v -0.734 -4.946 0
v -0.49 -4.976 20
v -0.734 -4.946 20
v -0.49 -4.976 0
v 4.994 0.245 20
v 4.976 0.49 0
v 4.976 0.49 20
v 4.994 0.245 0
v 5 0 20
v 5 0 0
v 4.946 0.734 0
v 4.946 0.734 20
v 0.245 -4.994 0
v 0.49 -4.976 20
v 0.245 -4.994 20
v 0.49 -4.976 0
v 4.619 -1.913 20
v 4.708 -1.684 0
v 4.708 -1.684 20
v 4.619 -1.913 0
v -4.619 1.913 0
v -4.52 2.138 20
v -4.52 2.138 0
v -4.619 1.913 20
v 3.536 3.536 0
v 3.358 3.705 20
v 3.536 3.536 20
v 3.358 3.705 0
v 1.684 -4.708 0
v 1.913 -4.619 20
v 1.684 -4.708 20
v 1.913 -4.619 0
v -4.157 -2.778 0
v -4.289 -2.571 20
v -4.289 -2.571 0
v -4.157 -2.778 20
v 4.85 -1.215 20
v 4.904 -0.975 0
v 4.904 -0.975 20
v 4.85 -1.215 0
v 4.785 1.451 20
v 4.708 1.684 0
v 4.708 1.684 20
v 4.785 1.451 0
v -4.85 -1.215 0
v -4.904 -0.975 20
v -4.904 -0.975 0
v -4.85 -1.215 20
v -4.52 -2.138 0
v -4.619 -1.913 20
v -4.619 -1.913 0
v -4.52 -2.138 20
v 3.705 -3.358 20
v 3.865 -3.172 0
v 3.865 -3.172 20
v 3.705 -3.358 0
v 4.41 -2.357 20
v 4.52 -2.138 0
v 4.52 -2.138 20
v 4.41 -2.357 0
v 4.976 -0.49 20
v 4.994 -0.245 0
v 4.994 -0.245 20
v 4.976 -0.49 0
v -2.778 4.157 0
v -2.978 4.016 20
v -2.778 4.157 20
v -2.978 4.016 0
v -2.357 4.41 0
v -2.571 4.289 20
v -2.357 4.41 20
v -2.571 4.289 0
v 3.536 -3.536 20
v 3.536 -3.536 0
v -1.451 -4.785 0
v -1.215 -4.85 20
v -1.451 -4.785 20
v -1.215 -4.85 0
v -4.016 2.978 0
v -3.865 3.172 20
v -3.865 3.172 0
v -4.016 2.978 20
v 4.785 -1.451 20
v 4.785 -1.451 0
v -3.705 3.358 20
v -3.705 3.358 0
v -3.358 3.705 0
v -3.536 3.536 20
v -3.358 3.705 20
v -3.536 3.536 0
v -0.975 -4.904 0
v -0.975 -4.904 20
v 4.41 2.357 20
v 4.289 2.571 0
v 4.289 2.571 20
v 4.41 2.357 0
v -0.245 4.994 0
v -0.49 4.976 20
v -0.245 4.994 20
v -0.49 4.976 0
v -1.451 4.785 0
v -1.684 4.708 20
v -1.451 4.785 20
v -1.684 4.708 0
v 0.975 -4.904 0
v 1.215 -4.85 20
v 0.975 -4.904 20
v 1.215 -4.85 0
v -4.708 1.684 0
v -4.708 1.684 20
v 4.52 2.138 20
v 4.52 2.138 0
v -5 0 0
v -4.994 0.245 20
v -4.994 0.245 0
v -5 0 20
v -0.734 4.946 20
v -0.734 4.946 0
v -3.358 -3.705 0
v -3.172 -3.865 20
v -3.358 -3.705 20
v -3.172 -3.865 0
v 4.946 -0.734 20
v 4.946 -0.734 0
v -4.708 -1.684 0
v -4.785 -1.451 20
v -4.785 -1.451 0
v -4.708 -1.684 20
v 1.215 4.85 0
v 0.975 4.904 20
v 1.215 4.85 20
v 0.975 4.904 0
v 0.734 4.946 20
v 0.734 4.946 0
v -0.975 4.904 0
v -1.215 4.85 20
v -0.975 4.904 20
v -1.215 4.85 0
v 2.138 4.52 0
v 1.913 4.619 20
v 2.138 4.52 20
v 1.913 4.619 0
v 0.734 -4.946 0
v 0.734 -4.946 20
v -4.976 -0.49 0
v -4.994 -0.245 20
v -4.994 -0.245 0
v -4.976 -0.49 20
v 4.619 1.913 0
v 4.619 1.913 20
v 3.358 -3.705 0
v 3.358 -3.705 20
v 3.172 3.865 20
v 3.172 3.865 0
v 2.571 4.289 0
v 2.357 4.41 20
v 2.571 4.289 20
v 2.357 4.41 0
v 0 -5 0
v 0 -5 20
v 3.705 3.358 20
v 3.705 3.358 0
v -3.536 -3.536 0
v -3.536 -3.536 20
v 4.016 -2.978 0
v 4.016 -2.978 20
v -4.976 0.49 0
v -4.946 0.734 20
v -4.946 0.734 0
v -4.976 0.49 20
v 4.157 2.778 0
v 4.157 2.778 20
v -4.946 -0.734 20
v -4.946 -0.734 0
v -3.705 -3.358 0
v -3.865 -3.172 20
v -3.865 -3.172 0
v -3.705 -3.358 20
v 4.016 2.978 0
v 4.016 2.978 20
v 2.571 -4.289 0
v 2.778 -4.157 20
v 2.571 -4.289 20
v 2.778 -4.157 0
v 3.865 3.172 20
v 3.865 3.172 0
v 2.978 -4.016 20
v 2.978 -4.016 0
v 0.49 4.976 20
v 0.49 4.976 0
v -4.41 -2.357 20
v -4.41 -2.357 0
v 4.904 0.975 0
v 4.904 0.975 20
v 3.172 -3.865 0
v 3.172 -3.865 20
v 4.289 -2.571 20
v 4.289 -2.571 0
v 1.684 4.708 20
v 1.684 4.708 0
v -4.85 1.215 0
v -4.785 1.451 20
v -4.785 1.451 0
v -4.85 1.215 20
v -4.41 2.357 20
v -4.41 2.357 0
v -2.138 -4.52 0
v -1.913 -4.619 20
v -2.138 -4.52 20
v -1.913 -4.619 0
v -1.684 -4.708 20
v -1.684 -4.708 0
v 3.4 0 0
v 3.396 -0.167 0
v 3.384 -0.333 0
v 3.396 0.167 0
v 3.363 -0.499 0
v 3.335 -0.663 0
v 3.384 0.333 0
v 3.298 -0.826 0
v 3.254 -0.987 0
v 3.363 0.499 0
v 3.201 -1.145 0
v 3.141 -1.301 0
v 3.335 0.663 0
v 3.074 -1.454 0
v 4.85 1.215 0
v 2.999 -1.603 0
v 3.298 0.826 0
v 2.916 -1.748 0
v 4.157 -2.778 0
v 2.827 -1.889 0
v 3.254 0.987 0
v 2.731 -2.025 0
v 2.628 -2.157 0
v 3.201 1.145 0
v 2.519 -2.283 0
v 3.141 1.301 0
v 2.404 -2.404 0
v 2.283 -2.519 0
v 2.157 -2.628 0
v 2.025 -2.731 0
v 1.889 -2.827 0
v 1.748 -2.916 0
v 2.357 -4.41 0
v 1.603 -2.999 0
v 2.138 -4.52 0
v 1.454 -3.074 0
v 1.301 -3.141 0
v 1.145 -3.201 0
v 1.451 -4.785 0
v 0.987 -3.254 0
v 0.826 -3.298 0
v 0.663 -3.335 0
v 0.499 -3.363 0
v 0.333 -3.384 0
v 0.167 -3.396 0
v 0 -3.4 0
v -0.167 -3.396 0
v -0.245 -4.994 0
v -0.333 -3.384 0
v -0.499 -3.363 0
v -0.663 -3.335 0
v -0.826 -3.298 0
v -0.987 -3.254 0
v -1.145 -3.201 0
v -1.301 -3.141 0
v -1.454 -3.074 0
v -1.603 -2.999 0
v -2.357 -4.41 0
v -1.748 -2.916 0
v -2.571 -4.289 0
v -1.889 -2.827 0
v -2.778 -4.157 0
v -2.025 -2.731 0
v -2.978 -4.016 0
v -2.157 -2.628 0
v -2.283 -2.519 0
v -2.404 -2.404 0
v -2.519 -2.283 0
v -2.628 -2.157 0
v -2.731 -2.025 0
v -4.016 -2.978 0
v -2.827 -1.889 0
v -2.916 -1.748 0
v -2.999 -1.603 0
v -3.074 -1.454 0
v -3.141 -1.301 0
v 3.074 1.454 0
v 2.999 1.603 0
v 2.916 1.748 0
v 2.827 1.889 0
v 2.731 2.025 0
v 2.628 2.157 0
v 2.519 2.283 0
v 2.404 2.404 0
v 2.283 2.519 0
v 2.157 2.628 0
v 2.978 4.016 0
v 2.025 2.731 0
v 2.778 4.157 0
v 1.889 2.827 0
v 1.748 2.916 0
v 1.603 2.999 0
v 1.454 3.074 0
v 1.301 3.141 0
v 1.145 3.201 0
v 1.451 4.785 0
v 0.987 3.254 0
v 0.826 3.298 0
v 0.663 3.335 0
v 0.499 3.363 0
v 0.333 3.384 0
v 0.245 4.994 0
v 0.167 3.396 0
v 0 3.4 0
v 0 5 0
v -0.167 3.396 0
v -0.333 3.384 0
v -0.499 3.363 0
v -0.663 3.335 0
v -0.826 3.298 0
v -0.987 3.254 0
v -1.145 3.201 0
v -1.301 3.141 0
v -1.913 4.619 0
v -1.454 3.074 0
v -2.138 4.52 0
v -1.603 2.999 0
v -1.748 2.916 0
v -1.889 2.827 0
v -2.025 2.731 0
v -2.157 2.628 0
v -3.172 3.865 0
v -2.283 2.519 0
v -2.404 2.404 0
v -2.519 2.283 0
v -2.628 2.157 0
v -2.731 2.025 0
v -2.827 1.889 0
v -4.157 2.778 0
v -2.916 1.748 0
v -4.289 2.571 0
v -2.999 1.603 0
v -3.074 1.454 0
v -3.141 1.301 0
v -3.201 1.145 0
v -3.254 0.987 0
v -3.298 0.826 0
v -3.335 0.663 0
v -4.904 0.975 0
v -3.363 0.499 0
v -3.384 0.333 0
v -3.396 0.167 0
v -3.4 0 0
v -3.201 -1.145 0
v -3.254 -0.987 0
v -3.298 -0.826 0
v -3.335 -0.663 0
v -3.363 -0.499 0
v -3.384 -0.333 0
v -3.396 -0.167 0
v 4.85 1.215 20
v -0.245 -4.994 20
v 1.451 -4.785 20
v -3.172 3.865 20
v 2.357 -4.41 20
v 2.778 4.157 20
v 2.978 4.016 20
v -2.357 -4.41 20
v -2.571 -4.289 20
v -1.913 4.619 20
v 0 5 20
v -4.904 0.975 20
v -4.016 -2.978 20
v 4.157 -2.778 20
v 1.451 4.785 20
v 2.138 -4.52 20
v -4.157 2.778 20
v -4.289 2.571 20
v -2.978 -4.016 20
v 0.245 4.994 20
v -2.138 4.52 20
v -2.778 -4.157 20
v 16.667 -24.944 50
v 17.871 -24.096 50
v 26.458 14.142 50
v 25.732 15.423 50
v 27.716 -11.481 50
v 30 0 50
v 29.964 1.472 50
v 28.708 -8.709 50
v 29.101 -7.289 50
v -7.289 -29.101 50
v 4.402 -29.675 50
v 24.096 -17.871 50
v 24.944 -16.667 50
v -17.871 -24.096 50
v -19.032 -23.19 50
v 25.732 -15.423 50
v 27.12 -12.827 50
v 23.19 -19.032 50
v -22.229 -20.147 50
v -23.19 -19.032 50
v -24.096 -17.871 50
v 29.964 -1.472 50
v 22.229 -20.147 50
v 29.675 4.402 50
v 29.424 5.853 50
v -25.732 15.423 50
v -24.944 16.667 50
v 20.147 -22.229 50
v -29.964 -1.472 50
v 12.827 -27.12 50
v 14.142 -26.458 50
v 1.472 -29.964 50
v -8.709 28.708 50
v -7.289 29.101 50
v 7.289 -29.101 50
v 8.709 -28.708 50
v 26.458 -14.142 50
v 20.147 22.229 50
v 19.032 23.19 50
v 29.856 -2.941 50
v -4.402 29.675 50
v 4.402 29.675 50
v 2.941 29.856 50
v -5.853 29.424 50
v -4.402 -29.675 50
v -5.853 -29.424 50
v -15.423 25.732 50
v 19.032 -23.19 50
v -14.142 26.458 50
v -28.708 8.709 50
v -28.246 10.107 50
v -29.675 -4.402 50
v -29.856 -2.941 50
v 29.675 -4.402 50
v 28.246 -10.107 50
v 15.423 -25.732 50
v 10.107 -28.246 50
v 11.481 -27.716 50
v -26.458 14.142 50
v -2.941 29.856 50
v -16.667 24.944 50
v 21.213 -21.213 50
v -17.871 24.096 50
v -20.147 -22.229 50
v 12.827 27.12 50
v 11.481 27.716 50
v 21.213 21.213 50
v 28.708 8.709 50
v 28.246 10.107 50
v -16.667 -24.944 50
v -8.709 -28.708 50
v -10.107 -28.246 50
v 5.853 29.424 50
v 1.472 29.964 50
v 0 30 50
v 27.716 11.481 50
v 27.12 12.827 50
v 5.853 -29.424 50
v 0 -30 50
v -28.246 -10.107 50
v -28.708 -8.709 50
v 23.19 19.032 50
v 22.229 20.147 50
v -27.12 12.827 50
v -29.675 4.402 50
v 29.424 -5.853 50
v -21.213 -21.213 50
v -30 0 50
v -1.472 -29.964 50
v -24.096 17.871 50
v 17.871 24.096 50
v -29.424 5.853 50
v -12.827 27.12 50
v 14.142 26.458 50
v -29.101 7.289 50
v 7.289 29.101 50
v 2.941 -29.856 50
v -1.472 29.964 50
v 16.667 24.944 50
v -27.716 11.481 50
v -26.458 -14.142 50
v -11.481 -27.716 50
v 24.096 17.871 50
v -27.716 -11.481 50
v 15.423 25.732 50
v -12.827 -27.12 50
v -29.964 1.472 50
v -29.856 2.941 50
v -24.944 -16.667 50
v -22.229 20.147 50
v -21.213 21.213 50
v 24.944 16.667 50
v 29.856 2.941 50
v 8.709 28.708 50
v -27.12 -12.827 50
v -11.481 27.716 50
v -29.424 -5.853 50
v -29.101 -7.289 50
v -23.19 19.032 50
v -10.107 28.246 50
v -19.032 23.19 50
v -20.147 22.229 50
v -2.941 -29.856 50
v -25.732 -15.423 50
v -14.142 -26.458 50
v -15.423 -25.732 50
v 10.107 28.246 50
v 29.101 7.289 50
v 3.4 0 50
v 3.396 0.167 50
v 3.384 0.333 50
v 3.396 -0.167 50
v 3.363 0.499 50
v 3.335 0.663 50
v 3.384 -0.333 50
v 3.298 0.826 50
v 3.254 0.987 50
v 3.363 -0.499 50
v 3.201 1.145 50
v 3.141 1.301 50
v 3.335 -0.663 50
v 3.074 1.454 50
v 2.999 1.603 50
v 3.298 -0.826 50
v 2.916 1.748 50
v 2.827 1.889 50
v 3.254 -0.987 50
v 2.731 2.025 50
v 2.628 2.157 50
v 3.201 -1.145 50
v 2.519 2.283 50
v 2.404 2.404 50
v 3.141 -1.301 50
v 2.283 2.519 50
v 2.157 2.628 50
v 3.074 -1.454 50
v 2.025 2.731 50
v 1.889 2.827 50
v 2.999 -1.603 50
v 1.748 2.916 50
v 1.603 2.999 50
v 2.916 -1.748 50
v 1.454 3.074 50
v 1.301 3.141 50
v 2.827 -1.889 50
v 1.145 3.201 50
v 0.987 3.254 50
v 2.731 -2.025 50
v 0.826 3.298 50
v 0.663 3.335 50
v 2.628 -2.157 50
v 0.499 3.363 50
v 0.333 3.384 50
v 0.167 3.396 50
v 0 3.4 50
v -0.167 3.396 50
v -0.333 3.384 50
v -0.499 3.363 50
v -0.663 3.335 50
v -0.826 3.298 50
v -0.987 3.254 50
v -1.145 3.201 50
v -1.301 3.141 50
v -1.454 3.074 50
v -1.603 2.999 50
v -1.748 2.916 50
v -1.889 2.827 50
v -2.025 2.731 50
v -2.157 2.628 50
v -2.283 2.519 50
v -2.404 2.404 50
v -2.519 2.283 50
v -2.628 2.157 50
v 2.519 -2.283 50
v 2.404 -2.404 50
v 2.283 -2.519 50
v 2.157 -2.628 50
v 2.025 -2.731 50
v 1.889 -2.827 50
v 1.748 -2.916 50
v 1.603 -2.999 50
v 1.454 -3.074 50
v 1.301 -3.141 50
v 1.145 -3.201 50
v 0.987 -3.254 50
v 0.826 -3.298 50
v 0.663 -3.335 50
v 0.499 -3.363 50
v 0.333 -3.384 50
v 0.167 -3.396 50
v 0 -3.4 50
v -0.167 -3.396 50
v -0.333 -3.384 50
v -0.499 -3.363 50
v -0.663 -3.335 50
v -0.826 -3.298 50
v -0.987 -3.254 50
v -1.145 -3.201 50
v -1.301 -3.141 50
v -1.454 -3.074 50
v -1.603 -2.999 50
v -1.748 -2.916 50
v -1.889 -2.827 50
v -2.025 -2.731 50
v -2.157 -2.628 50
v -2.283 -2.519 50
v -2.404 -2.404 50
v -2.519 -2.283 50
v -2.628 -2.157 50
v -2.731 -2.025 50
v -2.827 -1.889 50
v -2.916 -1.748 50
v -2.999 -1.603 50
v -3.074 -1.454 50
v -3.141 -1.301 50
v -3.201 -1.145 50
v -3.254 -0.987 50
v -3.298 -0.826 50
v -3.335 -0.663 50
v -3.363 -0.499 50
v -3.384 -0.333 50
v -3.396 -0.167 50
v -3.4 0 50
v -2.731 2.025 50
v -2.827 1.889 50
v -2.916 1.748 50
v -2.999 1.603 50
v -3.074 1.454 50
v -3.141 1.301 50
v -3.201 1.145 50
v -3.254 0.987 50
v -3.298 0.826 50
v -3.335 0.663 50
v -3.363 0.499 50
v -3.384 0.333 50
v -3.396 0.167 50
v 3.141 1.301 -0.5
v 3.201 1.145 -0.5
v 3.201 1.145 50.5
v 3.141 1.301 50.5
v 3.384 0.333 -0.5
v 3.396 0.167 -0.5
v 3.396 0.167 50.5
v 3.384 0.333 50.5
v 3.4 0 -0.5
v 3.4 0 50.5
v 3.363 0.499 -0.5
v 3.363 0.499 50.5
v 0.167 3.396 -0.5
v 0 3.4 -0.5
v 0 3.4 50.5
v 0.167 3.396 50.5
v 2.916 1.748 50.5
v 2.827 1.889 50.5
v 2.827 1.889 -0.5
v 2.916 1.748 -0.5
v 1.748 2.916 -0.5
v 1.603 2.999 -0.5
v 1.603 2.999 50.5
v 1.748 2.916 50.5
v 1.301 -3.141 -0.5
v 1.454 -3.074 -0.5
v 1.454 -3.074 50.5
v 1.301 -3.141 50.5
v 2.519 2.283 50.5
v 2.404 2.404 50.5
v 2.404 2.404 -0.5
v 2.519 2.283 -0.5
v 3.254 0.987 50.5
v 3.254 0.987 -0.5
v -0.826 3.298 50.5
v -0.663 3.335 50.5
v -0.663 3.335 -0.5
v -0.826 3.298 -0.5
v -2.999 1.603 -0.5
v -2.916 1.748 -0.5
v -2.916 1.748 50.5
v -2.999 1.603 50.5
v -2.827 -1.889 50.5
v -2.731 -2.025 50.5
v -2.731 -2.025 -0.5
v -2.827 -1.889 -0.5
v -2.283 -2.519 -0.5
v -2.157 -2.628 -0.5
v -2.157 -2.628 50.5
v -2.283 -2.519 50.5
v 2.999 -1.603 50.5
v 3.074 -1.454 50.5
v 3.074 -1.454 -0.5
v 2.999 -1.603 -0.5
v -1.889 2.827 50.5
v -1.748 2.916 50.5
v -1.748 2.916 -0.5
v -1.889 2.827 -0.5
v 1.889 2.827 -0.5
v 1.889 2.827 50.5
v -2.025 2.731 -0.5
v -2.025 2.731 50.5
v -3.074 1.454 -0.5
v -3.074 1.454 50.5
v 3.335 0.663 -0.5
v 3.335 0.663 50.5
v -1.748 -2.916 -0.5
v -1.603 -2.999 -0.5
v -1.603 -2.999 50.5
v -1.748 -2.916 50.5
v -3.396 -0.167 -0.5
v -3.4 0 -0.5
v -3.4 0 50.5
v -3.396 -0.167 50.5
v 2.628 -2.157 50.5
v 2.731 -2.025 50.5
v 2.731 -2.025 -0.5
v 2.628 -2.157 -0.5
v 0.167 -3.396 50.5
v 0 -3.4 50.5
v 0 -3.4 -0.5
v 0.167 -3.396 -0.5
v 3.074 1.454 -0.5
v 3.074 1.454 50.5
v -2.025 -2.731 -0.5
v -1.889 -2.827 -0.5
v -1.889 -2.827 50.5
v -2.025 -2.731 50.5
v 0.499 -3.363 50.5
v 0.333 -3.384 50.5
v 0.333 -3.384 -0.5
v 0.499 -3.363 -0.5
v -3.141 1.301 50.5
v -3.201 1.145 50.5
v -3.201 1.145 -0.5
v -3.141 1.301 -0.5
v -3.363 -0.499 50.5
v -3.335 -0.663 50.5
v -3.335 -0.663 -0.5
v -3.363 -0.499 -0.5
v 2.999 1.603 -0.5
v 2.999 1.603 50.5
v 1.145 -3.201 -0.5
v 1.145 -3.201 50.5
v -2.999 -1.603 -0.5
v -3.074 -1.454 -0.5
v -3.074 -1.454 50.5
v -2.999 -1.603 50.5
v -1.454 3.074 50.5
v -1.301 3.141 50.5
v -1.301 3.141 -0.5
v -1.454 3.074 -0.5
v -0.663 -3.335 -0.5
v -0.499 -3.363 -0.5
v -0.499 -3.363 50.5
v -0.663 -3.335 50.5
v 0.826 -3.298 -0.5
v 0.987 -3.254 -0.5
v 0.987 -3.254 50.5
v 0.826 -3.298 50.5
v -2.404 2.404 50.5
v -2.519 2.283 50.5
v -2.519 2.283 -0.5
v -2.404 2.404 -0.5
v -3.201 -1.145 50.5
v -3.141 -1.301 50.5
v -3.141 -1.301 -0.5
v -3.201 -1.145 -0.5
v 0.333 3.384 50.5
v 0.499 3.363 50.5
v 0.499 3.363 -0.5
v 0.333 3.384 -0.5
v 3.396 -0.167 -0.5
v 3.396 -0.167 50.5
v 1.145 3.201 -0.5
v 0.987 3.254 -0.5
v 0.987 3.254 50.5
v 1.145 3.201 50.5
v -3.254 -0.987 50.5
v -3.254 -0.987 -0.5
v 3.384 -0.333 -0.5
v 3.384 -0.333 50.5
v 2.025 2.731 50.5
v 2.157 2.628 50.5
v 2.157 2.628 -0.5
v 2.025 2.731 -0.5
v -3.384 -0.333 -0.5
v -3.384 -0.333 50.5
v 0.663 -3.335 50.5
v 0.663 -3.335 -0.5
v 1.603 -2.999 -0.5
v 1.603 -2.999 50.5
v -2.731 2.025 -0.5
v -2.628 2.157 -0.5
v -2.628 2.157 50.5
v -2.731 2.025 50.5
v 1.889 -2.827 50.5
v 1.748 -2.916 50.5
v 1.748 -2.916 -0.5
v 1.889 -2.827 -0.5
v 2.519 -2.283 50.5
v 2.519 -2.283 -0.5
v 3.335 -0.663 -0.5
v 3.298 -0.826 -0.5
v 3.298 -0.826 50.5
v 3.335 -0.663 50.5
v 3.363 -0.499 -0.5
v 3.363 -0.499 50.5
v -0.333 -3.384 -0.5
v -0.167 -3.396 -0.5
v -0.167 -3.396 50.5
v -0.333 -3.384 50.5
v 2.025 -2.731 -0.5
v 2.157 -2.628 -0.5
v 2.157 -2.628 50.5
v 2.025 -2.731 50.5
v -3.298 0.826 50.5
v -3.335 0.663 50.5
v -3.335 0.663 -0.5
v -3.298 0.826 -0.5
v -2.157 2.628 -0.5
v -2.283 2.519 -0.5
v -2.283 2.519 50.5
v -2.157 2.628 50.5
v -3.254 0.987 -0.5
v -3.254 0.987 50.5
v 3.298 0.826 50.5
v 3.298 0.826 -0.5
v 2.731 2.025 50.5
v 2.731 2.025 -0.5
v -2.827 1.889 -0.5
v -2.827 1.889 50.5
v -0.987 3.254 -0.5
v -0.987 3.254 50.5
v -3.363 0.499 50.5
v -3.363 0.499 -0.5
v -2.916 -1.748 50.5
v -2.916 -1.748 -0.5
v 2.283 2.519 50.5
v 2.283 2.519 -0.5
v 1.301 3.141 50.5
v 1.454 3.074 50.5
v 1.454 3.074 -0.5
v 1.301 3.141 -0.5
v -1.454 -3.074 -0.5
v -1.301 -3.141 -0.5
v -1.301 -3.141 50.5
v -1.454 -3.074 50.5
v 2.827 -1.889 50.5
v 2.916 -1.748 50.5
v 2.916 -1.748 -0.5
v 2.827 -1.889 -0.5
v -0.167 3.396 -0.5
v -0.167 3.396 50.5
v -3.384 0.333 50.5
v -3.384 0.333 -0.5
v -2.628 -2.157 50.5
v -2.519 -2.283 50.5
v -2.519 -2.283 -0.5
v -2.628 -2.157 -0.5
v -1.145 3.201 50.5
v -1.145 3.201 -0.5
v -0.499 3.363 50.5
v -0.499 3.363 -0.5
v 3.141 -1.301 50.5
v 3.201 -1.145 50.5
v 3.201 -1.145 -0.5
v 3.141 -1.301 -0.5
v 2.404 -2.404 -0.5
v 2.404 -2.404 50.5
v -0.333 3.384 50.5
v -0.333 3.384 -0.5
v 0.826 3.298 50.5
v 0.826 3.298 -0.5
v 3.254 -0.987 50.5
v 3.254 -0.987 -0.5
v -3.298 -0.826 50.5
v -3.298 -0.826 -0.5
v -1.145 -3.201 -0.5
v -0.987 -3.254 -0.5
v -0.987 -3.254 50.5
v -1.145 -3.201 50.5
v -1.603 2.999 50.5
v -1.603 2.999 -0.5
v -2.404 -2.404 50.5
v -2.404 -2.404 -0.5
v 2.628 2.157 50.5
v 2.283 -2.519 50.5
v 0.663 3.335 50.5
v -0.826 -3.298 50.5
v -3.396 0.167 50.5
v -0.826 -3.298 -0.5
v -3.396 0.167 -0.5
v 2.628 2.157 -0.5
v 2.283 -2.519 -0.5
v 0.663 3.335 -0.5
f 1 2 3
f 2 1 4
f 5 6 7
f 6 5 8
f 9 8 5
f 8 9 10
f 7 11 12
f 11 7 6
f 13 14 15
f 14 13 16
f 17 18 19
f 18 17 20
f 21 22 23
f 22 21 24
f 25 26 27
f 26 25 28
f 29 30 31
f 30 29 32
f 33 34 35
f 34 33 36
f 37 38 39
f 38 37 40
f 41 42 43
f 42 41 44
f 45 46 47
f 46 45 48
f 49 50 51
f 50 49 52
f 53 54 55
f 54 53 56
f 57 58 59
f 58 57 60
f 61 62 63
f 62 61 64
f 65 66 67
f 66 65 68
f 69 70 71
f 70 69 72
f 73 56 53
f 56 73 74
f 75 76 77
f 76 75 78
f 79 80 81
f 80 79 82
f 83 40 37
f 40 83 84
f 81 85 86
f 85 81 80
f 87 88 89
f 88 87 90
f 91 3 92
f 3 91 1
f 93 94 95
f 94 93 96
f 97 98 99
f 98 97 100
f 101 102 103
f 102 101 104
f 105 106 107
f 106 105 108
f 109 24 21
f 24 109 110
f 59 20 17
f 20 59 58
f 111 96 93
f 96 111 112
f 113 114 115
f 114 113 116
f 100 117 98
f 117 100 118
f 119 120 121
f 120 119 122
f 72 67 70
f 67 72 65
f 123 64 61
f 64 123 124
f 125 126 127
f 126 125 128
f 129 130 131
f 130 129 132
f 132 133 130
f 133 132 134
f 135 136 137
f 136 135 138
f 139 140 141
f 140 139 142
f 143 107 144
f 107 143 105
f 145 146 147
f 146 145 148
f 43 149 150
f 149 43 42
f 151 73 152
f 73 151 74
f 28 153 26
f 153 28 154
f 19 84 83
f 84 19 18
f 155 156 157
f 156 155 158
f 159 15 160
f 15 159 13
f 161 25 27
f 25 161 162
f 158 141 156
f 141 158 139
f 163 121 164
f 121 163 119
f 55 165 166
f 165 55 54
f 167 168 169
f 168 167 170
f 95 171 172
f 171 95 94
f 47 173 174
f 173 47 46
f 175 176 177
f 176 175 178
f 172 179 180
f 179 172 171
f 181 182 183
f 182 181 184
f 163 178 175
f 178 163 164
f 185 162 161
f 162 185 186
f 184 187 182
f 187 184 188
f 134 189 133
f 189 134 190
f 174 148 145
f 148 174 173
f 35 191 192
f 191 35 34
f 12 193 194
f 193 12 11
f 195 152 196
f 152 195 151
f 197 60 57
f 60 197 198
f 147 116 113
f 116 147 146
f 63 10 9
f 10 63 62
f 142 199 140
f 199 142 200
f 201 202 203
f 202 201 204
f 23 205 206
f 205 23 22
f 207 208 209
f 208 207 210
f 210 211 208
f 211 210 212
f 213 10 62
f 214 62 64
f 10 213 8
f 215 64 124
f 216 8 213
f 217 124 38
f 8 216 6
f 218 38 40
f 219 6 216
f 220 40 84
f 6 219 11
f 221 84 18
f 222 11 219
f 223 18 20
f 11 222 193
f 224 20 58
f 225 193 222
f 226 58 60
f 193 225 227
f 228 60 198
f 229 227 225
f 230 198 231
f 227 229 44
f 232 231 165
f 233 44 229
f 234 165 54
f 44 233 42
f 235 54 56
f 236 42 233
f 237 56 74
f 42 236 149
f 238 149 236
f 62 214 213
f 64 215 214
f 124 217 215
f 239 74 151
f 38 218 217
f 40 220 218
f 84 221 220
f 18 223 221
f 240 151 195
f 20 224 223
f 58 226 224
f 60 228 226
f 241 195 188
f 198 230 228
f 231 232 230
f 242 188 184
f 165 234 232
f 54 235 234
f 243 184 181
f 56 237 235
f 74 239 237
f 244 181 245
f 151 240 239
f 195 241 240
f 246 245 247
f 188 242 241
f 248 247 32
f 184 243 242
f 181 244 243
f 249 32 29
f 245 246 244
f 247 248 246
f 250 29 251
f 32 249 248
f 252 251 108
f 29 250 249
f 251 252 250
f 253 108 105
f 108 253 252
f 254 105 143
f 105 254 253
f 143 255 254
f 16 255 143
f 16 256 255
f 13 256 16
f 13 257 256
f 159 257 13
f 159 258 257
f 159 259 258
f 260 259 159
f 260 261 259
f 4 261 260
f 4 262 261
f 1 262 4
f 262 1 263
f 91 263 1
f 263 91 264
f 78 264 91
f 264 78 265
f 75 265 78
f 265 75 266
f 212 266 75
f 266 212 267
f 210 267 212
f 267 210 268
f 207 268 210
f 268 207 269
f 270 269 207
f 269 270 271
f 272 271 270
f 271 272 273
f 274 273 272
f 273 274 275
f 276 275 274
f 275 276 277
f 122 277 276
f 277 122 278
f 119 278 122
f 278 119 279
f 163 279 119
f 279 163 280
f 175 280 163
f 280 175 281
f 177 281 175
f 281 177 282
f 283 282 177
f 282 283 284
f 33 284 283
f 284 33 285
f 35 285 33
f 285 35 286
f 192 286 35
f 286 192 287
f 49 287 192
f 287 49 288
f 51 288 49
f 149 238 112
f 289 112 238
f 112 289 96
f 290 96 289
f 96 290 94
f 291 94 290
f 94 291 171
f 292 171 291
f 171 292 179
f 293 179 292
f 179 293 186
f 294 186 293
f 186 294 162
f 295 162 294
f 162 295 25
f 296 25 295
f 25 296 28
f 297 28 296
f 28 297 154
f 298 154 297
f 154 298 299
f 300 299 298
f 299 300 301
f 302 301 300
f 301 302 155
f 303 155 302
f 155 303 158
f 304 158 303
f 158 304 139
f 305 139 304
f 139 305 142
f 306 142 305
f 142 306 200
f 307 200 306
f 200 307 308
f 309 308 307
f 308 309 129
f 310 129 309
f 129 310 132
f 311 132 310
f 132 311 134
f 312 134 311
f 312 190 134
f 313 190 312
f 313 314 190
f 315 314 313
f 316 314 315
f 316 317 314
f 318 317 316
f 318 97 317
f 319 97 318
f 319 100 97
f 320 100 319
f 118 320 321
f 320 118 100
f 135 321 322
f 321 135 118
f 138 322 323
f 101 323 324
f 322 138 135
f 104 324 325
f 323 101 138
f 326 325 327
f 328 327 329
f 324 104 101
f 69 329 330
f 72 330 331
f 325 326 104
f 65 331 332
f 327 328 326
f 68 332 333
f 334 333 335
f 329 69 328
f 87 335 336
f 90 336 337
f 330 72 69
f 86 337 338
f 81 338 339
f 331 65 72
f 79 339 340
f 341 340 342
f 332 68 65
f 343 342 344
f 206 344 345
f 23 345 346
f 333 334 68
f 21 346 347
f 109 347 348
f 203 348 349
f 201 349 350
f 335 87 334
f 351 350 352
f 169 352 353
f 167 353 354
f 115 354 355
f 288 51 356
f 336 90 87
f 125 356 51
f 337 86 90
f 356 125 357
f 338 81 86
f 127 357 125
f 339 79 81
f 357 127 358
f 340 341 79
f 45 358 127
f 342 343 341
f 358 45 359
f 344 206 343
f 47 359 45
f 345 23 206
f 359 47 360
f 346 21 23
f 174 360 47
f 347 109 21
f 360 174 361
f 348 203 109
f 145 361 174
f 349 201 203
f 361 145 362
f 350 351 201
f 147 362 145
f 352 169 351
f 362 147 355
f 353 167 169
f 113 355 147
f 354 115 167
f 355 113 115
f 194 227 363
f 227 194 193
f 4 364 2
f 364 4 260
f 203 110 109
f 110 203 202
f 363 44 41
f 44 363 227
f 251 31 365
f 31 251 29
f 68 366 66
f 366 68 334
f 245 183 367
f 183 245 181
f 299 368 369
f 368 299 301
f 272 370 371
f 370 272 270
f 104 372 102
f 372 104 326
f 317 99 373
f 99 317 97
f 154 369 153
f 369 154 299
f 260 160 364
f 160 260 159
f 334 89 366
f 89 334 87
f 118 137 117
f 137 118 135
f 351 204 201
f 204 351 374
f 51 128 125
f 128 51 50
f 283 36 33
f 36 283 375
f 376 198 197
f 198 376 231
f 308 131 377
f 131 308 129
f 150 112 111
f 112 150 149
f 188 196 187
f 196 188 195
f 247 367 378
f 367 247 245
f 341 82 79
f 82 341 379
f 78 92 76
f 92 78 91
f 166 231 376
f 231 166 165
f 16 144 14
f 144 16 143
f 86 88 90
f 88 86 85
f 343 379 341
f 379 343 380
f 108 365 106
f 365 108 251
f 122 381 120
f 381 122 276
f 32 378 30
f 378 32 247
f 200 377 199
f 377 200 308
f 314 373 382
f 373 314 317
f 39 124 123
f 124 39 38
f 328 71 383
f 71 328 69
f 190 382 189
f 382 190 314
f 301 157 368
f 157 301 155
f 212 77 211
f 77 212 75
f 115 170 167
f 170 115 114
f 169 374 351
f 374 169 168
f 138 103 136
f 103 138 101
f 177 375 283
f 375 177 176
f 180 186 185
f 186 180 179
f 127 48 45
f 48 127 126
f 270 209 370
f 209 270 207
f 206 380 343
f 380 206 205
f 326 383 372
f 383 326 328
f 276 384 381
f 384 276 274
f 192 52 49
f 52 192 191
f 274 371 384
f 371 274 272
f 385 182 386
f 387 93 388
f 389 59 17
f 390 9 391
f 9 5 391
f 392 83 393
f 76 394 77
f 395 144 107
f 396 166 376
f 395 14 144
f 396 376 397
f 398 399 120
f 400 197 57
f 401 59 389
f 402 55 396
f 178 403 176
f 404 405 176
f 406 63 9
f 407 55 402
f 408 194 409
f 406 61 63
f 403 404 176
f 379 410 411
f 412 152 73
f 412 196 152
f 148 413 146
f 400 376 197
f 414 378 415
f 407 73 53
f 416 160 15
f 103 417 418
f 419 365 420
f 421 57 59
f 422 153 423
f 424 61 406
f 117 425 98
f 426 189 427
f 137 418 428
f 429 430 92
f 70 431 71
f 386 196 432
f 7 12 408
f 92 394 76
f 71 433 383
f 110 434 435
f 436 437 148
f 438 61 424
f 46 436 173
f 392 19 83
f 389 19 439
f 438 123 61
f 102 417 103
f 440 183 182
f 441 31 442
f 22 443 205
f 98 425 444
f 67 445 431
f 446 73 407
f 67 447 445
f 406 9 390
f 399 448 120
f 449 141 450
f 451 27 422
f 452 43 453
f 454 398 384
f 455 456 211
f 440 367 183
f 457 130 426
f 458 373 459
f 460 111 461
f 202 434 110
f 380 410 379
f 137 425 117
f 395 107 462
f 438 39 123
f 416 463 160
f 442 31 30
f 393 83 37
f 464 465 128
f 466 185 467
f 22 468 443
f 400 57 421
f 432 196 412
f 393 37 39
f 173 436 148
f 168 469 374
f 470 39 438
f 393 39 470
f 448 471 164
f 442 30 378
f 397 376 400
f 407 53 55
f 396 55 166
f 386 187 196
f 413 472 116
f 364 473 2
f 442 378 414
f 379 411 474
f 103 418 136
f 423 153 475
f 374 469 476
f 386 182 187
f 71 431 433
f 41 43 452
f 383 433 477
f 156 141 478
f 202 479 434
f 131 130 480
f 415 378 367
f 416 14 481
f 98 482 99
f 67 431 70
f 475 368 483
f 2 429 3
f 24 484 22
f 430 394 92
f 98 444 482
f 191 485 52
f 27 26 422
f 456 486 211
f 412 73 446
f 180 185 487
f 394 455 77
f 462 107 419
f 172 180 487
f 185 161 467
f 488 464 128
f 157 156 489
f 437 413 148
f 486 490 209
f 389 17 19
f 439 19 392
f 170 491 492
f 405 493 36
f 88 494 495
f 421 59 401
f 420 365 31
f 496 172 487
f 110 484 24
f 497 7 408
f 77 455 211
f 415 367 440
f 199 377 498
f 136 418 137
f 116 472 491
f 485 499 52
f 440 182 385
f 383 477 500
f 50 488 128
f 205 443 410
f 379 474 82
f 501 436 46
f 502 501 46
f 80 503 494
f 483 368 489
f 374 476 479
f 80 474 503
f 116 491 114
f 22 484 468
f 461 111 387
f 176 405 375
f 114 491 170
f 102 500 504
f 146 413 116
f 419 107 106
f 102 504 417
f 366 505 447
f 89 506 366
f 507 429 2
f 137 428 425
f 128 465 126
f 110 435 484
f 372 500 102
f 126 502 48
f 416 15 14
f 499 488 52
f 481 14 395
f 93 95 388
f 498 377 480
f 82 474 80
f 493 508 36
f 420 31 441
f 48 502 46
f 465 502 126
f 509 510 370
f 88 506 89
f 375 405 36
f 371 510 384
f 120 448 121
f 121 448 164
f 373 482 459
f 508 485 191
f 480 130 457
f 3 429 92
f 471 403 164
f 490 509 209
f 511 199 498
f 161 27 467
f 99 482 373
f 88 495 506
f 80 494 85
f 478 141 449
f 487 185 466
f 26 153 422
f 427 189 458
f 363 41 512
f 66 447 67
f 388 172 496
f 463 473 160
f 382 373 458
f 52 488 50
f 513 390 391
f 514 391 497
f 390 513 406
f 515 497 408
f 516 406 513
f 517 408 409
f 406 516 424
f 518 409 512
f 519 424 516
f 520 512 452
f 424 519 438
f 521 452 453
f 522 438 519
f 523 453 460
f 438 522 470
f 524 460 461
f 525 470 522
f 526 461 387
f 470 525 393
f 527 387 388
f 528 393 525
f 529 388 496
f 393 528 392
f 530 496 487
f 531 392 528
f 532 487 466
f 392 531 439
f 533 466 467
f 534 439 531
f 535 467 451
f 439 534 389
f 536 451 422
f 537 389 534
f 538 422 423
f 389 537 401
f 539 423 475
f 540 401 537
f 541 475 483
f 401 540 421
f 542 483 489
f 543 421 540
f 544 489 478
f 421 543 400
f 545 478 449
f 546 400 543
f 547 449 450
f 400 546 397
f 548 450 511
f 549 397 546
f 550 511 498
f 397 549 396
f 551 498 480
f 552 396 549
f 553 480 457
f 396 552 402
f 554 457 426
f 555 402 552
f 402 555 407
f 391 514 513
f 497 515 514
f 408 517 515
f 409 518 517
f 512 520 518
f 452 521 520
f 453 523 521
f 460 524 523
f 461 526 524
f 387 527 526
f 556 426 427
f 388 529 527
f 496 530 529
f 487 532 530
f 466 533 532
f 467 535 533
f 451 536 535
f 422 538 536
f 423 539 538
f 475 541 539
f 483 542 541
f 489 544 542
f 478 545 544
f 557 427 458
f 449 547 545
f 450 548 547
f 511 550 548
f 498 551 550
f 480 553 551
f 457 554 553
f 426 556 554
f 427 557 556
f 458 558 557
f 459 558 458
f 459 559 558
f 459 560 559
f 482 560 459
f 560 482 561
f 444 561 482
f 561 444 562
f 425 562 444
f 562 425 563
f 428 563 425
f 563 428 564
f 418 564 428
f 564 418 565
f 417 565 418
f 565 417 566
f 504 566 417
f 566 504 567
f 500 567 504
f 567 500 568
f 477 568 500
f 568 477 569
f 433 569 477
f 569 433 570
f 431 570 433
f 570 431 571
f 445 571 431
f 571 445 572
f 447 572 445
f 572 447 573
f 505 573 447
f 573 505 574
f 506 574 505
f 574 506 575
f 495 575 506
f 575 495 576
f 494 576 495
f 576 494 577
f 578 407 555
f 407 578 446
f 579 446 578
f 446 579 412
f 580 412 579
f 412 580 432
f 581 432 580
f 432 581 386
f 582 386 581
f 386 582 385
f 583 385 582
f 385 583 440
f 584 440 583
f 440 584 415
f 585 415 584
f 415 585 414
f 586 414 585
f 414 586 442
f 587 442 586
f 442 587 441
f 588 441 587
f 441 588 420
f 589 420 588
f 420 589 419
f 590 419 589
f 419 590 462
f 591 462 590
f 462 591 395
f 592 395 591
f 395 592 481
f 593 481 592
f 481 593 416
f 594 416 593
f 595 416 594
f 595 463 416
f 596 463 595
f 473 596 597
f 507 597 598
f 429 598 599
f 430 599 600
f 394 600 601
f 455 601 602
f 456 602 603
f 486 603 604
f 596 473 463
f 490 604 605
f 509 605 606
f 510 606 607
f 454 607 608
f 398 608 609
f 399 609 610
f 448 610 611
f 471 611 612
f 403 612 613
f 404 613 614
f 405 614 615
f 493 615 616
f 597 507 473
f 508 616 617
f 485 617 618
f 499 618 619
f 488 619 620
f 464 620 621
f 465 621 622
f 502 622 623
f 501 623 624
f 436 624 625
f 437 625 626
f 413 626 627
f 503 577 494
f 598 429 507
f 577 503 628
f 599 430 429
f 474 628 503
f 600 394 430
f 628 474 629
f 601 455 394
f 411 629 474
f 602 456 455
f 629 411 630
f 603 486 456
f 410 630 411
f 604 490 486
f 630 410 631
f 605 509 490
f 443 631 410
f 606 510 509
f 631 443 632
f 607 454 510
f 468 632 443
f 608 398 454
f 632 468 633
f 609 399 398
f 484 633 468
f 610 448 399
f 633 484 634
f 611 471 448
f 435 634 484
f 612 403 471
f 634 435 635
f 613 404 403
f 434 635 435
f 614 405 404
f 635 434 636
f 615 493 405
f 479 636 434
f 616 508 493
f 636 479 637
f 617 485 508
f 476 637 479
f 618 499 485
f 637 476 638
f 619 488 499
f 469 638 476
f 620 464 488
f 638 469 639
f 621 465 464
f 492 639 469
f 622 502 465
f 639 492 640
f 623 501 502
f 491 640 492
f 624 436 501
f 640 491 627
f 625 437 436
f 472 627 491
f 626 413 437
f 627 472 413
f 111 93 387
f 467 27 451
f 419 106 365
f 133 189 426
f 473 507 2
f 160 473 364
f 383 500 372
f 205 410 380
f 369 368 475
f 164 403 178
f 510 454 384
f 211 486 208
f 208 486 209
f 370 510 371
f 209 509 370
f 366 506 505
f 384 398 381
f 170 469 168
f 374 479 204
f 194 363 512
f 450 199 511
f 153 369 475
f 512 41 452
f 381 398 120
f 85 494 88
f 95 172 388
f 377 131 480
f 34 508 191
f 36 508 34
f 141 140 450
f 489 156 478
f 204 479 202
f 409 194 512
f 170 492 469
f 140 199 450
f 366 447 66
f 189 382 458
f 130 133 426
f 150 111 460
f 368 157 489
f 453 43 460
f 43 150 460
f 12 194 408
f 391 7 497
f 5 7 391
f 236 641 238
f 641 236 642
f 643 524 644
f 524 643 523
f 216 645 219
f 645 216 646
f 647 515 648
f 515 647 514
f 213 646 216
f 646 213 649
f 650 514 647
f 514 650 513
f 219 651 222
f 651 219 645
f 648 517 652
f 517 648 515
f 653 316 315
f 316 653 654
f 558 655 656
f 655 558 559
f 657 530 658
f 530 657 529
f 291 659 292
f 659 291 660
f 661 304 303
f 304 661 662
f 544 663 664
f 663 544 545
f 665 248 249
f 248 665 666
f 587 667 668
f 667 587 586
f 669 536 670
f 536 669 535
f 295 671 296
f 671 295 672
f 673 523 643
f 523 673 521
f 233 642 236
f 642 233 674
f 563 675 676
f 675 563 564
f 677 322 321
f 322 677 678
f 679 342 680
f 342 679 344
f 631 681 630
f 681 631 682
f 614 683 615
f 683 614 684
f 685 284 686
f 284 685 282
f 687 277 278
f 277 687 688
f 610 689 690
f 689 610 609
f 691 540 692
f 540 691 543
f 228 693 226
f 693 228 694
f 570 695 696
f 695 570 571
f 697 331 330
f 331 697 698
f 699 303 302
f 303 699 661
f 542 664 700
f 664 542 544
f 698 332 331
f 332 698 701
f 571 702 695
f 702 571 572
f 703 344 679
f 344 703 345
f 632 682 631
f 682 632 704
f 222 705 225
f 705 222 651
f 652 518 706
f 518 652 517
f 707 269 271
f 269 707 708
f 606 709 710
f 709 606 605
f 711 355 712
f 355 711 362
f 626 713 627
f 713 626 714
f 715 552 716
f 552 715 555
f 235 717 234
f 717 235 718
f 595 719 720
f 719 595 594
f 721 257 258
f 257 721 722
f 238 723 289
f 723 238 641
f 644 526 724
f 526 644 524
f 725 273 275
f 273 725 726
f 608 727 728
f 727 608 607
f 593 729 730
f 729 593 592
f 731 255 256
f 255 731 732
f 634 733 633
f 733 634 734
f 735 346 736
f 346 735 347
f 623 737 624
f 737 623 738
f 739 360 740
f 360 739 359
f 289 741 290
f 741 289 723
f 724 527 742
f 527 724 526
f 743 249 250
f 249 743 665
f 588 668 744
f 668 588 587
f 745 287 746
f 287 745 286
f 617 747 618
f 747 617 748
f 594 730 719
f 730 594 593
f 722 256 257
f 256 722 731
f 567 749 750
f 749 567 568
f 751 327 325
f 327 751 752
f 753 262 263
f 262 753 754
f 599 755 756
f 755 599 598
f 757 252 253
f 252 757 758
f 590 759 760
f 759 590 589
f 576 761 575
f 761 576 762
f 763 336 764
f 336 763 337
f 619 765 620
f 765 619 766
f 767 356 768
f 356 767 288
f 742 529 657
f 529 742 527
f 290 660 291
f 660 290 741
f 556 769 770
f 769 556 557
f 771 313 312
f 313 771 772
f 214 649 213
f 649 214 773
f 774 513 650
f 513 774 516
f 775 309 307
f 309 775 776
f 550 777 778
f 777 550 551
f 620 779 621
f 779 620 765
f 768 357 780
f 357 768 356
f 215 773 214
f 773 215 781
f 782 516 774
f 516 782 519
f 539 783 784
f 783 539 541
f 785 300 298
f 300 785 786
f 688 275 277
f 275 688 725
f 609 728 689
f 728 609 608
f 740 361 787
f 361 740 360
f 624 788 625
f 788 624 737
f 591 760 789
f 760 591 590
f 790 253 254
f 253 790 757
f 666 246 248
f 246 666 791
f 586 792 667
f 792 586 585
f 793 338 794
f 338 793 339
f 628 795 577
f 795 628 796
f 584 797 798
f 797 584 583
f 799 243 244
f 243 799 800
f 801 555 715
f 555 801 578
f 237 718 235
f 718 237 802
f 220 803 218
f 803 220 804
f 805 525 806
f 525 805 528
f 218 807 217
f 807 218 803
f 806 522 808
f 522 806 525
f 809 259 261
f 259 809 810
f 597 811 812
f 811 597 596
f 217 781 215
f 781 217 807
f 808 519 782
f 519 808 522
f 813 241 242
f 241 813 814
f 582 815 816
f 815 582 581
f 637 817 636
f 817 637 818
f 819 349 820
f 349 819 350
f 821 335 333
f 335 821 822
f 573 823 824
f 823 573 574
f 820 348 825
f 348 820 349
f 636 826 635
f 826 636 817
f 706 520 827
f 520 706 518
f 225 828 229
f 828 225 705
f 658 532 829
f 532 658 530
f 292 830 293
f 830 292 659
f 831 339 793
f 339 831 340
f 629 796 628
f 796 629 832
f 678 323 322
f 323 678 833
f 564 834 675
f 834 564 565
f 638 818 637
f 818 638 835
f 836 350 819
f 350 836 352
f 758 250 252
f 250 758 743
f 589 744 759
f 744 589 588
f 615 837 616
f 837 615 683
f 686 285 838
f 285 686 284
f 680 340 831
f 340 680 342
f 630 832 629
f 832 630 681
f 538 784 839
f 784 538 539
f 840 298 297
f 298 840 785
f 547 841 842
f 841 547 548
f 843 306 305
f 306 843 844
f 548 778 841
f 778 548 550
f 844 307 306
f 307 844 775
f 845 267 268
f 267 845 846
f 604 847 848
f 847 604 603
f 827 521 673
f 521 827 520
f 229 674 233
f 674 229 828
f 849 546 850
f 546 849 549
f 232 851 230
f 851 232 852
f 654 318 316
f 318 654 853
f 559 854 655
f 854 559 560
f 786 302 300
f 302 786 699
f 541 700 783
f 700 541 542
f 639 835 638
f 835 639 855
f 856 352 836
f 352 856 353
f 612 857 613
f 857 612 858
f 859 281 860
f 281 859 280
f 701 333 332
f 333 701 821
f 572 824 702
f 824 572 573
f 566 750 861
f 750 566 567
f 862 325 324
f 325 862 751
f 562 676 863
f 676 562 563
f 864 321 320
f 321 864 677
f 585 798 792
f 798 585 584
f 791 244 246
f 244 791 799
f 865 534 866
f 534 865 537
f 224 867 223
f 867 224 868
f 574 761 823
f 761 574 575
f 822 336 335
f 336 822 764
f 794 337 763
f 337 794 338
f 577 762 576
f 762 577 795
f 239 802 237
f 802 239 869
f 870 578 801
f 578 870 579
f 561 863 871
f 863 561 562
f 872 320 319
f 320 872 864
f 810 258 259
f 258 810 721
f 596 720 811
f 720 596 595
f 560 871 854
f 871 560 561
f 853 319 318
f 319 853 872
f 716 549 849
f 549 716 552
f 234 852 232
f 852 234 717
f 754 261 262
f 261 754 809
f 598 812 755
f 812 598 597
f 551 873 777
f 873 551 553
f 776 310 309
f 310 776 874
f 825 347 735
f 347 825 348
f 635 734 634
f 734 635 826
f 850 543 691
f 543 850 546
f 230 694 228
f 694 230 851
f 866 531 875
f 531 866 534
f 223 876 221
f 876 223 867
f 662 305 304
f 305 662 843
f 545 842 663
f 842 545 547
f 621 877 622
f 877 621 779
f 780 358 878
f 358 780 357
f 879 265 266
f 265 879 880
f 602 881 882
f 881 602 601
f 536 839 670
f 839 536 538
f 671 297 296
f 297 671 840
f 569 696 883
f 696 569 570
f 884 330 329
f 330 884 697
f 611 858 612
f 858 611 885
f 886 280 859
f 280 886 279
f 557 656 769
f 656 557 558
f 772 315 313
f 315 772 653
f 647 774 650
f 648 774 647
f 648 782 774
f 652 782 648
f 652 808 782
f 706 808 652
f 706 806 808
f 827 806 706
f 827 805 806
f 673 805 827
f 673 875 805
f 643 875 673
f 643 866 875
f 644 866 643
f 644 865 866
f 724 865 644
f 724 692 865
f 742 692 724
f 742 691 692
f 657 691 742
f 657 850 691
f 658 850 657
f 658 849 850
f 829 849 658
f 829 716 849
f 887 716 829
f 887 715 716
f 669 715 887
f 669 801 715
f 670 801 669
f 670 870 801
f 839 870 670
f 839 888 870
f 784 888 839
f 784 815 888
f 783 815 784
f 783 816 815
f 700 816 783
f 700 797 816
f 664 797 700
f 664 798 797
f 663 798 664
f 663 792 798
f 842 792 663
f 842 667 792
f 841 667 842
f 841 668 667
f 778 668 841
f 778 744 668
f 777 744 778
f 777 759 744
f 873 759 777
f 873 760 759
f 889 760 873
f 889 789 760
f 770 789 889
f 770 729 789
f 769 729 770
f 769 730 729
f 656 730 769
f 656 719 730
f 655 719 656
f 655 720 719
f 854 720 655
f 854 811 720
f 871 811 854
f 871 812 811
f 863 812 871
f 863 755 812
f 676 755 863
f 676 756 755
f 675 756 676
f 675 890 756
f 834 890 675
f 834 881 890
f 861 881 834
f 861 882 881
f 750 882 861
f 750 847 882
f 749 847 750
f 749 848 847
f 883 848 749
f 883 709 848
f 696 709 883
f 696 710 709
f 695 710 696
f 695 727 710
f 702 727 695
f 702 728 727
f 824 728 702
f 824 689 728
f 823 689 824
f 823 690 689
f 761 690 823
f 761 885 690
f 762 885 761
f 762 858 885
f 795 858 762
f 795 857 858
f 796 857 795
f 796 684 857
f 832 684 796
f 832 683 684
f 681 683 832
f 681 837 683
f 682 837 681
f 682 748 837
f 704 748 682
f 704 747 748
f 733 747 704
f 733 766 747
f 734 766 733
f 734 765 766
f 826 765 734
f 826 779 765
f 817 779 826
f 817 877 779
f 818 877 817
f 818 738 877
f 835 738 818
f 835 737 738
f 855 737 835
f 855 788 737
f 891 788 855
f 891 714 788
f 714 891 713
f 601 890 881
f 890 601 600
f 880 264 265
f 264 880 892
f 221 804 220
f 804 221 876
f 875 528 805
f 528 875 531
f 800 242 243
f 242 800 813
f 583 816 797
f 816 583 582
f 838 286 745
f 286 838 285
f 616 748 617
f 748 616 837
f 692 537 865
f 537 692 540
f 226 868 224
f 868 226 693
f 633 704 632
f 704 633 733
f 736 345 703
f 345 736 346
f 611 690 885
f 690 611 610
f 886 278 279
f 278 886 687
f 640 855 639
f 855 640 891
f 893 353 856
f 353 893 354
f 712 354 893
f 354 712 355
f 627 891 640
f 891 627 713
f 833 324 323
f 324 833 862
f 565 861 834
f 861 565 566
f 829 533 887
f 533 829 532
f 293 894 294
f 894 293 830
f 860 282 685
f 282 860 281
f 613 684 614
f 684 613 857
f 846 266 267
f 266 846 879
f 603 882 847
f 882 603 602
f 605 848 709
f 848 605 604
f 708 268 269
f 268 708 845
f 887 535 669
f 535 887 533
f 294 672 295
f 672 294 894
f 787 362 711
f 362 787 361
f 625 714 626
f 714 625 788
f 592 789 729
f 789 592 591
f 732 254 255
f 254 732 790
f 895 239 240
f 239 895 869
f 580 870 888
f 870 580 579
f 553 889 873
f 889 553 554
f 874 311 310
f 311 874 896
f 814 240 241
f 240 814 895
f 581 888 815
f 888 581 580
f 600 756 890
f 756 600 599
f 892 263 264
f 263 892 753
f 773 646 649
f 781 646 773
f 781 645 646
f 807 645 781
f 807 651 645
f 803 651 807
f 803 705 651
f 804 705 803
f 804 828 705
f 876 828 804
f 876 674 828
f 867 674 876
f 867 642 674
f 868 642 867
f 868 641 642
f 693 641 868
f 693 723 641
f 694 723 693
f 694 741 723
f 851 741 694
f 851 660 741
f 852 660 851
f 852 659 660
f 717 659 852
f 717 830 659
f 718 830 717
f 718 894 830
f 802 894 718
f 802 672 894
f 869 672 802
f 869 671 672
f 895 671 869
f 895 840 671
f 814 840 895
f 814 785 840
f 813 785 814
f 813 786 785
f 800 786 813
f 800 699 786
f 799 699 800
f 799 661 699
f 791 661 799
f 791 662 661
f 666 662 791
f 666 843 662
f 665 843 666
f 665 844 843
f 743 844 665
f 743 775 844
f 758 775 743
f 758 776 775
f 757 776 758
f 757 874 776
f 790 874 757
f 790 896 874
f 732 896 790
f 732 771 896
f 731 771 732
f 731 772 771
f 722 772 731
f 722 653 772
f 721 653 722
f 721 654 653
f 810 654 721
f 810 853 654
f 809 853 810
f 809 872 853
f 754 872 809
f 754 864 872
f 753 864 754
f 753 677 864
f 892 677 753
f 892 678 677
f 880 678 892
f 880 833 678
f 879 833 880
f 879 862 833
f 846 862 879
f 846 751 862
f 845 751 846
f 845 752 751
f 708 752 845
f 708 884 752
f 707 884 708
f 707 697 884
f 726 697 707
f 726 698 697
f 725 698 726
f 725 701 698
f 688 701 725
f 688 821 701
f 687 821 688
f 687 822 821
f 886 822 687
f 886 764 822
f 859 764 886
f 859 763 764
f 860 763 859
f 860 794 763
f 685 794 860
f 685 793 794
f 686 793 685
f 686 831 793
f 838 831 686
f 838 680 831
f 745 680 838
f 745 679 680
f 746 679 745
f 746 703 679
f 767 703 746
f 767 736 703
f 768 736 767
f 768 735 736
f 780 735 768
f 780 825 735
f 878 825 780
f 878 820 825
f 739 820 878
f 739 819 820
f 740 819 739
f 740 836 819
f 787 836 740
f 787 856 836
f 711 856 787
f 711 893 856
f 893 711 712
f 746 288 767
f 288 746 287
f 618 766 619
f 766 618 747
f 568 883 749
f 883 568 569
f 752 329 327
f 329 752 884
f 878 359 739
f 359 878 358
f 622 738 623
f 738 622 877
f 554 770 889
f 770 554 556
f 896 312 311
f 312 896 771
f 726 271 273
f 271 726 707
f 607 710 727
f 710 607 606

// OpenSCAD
// Lab funnel - printed upright, open at top and bottom
// Units: mm

// ---- Parameters ----
spout_od      = 10;    // spout outer diameter
spout_h       = 20;    // spout height (z = 0 to 20)
cone_od_top   = 60;    // cone rim outer diameter (z = 50)
cone_h        = 30;    // cone height (z = 20 to 50)
wall          = 1.6;   // wall thickness everywhere
eps           = 0.5;   // cutter overshoot past faces

$fn = 128;

// ---- Derived ----
spout_id = spout_od - 2 * wall;   // bore diameter
cone_id_top = cone_od_top - 2 * wall; // rim bore diameter

// ---- Model ----
union() {
    // Spout (tube)
    translate([0, 0, 0])
        cylinder(d = spout_od, h = spout_h);

    // Cone
    translate([0, 0, spout_h])
        cylinder(d1 = spout_od, d2 = cone_od_top, h = cone_h);
}

// Cut through the axis so liquid runs straight through
translate([0, 0, -eps])
    cylinder(d = spout_id, h = spout_h + cone_h + 2 * eps);
